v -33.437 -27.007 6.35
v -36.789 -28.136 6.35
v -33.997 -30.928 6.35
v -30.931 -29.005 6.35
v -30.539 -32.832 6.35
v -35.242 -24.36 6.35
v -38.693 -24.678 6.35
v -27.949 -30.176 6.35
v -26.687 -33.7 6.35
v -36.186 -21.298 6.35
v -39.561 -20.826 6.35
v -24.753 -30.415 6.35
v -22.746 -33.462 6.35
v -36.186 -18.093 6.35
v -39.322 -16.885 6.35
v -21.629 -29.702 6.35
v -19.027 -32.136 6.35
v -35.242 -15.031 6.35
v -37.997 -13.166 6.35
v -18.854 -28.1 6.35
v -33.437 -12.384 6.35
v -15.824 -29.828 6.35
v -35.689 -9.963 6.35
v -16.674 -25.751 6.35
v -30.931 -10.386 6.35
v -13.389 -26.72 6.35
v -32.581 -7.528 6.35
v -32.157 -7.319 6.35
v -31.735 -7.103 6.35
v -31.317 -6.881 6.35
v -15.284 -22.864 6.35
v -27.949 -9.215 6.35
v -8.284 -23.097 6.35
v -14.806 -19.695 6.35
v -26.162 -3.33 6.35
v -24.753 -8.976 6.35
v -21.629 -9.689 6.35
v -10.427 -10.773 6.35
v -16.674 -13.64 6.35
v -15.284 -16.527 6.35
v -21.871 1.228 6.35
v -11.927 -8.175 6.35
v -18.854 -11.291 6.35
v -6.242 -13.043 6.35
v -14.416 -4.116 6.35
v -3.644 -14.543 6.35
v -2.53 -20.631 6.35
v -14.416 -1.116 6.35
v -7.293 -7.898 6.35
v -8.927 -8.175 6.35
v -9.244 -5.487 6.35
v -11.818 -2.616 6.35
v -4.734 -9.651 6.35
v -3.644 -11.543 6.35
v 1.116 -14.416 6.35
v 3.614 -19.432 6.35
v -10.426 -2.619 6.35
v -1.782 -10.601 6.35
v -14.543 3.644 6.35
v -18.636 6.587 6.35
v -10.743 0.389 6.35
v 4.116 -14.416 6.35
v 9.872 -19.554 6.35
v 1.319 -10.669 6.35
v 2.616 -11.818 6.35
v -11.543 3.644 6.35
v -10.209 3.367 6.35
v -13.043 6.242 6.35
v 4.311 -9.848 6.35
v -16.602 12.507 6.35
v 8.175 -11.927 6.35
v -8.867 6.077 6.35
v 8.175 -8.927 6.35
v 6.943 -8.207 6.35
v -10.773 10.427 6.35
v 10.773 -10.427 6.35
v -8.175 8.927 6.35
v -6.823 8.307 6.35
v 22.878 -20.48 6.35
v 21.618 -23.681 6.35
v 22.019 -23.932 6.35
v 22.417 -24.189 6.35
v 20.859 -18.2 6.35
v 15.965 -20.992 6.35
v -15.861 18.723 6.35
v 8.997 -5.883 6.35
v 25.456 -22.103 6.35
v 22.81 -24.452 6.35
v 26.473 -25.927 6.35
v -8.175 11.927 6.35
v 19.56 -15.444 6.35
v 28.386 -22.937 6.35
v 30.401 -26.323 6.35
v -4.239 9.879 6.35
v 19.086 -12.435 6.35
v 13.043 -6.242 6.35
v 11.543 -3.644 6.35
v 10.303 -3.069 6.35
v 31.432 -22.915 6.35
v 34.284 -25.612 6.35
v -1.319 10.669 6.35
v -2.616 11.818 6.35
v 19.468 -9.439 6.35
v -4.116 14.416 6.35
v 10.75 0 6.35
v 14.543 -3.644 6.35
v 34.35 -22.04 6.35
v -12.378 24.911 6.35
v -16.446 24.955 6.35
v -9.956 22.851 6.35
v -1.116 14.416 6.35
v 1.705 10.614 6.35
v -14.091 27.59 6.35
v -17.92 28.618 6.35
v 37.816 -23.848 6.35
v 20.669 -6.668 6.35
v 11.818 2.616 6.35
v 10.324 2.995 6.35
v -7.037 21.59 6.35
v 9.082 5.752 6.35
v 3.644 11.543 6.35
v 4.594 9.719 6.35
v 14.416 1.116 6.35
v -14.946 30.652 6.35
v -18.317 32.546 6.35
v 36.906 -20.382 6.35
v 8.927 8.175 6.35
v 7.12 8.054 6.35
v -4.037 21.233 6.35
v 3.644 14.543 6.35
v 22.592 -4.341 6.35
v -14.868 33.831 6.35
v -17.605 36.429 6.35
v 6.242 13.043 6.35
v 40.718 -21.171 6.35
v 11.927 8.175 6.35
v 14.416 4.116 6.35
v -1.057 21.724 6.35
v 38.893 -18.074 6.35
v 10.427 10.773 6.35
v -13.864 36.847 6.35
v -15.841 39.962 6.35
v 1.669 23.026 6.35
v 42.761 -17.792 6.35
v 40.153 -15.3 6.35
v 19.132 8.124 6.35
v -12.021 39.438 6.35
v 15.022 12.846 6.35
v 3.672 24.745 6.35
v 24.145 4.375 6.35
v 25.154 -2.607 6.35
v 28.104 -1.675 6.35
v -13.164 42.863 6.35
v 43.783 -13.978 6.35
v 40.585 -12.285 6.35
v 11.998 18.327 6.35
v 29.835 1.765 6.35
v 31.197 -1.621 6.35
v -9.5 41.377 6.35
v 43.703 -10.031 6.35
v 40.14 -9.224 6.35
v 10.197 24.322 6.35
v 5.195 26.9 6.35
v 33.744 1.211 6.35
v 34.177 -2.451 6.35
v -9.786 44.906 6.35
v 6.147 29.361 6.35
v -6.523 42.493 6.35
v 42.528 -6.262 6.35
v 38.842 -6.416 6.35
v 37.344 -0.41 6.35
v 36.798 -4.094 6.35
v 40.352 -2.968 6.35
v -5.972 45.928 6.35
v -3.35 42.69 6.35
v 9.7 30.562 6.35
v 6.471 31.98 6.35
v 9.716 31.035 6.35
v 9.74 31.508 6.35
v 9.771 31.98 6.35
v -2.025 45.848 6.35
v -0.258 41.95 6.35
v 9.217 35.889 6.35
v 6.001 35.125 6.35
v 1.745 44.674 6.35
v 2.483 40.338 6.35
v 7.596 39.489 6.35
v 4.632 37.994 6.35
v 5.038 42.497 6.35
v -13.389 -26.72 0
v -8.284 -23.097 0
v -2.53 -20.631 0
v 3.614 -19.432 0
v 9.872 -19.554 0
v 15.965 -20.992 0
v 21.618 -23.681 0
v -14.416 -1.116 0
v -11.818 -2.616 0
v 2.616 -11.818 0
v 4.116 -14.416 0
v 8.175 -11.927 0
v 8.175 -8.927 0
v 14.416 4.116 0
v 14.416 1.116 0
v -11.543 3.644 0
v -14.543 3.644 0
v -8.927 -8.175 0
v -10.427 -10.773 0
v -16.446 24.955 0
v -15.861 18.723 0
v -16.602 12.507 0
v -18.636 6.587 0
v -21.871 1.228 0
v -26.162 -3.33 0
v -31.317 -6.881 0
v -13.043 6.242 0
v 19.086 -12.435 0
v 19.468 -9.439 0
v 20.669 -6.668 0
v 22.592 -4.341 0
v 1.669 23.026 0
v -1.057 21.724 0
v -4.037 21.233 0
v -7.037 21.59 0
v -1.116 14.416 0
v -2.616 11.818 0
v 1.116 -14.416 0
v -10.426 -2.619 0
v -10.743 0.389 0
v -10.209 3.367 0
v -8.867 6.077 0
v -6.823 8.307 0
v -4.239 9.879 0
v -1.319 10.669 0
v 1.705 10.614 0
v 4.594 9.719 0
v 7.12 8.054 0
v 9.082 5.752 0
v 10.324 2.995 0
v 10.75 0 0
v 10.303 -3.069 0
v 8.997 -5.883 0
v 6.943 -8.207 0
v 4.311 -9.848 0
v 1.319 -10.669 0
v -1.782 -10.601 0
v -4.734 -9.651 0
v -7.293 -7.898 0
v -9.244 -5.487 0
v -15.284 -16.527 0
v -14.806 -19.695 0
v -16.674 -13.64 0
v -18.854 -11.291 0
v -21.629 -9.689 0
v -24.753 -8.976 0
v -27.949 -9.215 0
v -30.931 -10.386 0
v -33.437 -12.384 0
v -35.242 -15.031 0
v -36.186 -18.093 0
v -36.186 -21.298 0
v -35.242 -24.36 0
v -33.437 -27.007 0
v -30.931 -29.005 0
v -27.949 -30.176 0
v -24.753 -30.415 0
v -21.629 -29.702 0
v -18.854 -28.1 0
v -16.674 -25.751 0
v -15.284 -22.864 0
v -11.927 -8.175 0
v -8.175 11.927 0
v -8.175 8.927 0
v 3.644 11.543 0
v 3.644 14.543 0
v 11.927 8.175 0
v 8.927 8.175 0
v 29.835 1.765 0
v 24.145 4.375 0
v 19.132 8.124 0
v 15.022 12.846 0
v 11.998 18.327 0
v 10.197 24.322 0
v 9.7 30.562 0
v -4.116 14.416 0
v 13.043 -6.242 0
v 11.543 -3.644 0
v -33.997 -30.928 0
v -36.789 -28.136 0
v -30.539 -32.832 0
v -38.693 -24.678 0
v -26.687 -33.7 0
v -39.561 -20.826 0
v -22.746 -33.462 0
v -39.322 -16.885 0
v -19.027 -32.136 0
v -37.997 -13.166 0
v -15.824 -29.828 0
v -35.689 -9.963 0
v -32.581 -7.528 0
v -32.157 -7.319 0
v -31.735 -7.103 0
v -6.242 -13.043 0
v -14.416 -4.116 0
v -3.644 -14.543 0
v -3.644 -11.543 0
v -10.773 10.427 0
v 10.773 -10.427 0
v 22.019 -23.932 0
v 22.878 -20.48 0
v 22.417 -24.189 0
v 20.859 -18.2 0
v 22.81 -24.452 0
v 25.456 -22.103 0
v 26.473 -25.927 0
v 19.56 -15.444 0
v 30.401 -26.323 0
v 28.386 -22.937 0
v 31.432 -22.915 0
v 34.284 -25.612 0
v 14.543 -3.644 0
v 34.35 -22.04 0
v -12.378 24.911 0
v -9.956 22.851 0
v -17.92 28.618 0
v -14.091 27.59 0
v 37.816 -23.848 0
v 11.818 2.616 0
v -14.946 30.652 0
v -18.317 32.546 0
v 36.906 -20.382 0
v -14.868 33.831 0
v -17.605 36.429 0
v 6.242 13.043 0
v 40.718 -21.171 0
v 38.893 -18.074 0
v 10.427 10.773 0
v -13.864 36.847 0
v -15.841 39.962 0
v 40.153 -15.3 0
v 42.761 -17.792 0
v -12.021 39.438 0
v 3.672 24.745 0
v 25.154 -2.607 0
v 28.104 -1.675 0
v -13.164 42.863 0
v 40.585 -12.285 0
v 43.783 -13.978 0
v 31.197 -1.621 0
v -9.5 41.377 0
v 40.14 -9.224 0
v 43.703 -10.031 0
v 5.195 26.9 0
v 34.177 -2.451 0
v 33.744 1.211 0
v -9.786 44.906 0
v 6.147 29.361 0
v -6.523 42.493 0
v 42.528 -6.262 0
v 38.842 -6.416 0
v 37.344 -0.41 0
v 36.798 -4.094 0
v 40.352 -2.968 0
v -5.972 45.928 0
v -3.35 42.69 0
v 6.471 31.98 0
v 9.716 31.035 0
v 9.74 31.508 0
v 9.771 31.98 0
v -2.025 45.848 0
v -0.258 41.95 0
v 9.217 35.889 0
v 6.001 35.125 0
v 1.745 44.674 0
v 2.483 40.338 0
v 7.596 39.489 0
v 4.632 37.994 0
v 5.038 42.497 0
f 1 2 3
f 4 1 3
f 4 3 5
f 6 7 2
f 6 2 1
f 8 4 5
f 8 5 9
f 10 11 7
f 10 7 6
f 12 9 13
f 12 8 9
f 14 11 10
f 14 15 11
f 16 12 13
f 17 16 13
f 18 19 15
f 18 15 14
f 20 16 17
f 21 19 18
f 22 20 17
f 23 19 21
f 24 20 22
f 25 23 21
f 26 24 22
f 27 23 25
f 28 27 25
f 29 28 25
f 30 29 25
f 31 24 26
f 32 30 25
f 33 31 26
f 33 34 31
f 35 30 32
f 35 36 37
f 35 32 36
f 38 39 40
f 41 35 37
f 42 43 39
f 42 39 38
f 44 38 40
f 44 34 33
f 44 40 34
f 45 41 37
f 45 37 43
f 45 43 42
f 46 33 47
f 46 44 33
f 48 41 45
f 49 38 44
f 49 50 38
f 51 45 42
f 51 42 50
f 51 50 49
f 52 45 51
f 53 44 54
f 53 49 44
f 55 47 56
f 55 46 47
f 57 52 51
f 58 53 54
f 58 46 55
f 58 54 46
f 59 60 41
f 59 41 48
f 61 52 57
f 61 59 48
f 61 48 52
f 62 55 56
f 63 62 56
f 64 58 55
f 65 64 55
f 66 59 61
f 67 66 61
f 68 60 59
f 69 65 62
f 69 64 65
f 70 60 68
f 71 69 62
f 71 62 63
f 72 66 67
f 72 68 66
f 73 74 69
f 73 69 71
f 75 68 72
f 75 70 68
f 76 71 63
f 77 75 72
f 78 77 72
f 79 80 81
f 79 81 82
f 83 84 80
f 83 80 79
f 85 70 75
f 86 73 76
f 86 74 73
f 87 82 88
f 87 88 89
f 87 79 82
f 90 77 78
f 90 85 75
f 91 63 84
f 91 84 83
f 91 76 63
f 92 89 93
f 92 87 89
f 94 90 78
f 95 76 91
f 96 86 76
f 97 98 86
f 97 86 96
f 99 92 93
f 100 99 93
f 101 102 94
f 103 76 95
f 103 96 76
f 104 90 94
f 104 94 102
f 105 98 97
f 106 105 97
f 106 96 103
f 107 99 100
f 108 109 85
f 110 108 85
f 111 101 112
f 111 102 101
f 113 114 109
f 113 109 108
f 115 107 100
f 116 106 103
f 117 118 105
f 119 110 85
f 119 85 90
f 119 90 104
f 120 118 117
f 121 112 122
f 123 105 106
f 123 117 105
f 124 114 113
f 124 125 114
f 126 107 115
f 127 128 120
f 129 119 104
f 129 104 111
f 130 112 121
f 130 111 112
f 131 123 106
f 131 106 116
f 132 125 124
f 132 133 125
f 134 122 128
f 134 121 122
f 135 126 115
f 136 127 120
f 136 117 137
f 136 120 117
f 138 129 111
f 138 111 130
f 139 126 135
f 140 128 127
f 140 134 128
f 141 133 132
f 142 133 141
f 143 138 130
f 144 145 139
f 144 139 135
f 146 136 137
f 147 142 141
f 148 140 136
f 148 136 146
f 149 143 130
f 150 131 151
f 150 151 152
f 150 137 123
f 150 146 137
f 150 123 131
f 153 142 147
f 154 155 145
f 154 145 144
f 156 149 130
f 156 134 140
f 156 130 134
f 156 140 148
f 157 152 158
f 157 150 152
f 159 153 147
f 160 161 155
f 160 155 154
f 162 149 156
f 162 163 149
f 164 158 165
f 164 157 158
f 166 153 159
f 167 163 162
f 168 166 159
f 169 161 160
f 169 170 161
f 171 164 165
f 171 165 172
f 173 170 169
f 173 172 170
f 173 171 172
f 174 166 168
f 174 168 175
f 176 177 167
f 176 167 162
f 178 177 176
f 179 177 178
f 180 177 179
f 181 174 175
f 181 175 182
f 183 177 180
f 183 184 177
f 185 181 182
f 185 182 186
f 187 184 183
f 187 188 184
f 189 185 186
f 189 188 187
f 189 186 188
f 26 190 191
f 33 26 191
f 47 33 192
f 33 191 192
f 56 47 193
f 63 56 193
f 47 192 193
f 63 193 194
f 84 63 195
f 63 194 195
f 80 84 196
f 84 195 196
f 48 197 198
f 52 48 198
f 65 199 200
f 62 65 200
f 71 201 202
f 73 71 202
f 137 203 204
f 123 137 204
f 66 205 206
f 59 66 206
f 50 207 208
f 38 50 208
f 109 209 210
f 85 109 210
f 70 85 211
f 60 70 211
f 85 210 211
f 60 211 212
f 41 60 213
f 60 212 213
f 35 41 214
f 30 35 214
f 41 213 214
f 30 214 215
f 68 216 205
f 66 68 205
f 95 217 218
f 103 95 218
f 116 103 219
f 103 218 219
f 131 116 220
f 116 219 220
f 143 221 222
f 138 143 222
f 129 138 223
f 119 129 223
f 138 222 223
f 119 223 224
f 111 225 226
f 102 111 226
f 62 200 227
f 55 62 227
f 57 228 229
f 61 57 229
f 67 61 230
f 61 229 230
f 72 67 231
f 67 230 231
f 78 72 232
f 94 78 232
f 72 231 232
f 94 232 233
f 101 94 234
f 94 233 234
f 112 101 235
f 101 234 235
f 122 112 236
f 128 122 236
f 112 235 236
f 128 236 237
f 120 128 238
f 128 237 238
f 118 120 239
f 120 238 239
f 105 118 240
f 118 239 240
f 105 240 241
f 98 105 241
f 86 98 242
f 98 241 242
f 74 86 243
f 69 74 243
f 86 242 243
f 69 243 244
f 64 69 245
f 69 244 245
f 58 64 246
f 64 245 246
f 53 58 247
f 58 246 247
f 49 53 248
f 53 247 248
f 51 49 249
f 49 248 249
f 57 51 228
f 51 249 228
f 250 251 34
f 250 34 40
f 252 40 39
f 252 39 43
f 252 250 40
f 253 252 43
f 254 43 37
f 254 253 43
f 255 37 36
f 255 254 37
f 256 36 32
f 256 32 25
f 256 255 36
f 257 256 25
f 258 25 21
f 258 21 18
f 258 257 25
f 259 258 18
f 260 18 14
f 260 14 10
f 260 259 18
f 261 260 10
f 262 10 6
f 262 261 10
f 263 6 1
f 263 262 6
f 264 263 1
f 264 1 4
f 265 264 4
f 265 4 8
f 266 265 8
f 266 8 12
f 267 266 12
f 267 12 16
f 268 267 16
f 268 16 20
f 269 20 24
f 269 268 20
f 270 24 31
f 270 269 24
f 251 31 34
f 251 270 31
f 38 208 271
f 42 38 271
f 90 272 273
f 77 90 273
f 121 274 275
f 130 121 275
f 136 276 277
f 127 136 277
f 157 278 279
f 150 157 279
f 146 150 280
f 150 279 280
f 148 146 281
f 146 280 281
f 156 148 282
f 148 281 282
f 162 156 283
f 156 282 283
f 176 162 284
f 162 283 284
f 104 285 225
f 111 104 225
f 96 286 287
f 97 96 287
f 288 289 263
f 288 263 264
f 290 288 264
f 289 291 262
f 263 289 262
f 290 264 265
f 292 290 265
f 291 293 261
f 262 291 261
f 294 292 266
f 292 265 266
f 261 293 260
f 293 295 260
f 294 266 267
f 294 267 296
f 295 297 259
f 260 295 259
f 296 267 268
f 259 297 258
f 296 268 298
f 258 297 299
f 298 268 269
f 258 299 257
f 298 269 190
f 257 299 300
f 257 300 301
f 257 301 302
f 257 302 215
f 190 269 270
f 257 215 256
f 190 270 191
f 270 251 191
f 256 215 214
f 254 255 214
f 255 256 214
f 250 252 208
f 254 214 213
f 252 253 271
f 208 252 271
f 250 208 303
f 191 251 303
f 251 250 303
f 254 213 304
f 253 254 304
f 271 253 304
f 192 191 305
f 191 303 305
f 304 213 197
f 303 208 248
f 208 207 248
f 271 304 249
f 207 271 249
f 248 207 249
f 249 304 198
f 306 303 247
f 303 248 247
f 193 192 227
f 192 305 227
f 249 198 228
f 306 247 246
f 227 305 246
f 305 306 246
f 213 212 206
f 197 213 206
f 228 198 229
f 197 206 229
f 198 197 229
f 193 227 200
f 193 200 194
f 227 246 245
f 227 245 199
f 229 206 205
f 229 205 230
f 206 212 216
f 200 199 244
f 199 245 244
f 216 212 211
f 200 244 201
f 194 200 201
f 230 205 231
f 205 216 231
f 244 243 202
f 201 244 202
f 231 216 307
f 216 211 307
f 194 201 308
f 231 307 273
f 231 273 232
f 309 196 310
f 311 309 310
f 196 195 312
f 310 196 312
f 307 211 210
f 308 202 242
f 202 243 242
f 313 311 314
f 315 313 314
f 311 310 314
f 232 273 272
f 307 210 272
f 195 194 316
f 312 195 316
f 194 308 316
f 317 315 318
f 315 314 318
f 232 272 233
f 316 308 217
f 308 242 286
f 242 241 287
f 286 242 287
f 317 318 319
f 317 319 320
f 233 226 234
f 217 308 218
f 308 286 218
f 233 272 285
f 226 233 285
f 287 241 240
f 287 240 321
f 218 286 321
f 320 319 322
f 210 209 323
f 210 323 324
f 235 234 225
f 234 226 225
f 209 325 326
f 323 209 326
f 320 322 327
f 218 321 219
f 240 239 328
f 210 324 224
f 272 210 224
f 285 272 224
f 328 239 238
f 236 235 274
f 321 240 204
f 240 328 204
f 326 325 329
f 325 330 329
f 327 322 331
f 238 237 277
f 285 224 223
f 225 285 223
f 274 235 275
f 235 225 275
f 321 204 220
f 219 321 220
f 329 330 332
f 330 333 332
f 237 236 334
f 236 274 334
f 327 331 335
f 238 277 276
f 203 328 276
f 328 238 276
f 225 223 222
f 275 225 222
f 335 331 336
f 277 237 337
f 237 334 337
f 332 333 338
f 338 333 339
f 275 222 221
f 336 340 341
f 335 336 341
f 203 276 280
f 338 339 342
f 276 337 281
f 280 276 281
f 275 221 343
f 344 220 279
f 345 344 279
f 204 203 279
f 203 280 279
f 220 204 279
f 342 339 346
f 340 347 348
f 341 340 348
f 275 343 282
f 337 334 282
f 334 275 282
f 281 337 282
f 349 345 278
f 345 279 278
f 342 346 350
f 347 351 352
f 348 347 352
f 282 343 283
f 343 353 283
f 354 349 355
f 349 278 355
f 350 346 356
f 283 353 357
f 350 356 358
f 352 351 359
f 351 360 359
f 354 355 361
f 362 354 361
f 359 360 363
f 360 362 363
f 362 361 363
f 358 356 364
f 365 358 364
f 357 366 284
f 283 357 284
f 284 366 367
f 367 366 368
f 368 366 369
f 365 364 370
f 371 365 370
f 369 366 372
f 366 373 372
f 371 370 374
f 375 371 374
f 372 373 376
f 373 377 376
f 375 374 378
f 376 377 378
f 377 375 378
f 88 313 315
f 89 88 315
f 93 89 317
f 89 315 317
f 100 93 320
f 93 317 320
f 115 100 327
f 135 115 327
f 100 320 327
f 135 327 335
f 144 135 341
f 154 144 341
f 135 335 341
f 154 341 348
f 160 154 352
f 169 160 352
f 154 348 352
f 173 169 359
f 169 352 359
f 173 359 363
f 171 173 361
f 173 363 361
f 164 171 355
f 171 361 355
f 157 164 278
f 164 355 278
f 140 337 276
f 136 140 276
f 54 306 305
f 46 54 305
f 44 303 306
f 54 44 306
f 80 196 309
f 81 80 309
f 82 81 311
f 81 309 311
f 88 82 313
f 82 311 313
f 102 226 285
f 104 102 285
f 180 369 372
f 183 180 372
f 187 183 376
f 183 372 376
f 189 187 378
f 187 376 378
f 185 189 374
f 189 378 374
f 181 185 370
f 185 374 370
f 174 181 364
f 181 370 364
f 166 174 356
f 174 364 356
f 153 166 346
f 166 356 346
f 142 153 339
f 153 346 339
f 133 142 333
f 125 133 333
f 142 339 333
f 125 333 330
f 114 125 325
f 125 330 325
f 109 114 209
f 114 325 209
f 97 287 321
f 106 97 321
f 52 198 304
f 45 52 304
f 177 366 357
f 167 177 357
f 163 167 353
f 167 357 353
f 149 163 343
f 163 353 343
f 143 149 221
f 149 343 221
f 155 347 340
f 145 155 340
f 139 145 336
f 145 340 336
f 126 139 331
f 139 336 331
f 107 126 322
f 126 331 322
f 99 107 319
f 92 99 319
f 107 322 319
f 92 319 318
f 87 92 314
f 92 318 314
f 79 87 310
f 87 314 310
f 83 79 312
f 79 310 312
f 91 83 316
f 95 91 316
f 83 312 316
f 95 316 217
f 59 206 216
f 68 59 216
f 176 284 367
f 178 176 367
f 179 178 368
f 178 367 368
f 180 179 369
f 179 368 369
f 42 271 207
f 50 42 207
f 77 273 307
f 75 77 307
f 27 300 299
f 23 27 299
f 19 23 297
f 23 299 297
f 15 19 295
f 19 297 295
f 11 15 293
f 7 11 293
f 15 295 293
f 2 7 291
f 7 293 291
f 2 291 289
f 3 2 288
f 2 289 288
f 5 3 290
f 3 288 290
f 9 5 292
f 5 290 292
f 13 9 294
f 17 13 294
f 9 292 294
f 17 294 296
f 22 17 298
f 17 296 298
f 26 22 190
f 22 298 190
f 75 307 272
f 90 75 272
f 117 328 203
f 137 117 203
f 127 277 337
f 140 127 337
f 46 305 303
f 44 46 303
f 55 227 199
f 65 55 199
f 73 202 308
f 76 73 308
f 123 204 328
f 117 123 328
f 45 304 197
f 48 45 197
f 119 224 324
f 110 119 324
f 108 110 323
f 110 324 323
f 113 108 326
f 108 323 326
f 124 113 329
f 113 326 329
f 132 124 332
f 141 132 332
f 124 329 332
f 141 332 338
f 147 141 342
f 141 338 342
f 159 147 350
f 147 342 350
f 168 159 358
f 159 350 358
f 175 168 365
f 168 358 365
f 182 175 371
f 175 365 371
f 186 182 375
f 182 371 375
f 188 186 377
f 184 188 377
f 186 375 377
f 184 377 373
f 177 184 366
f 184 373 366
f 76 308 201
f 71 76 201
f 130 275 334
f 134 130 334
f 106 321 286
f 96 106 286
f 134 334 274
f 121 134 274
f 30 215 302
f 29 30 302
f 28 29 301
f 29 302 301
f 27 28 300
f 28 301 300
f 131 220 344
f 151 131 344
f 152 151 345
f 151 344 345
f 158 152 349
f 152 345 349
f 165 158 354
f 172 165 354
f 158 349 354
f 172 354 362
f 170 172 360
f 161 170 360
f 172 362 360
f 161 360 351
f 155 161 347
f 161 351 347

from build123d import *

# Parameters (mm, degrees)
F0_R     = 10.75
F1_DEPTH = 6.35


with BuildPart() as f1:
    # F0 (on Top) → F1 (new body)
    with BuildSketch(Plane.XY):
        with BuildLine():
            ThreePointArc((-16.446219, 24.955231), (-18.635535, 6.586639), (-31.317256, -6.880812))
            ThreePointArc((-31.317256, -6.880812), (-31.945446, -7.211903), (-32.581411, -7.527802))
            ThreePointArc((-32.581411, -7.527802), (-35.491262, -29.630309), (-13.388754, -26.720459))
            ThreePointArc((-13.388754, -26.720459), (3.613571, -19.432166), (21.617586, -23.681133))
            ThreePointArc((21.617586, -23.681133), (22.218414, -24.059617), (22.809974, -24.452429))
            ThreePointArc((22.809974, -24.452429), (43.406231, -15.921179), (29.834974, 1.765228))
            ThreePointArc((29.834974, 1.765228), (15.021964, 12.845527), (9.69967, 30.561945))
            ThreePointArc((9.69967, 30.561945), (9.727032, 31.271519), (9.771438, 31.980231))
            ThreePointArc((9.771438, 31.980231), (-7.91497, 45.551489), (-16.446219, 24.955231))
        make_face()
        with Locations((-25.556411, -19.695459)):
            Circle(F0_R, mode=Mode.SUBTRACT)
        Polygon((-8.926963, -8.174784), (-10.426963, -10.772861), (-11.926963, -8.174784), align=None, mode=Mode.SUBTRACT)
        Polygon((-3.643584, -11.543052), (-3.643584, -14.543052), (-6.241661, -13.043052), align=None, mode=Mode.SUBTRACT)
        Polygon((-11.818369, -2.61609), (-14.416445, -4.11609), (-14.416445, -1.11609), align=None, mode=Mode.SUBTRACT)
        Polygon((-11.543052, 3.643584), (-14.543052, 3.643584), (-13.043052, 6.241661), align=None, mode=Mode.SUBTRACT)
        with BuildLine():
            ThreePointArc((-10.42615, -2.618758), (-1.319353, 10.66873), (10.75, 0))
            ThreePointArc((10.75, 0), (1.319353, -10.66873), (-10.42615, -2.618758))
        make_face(mode=Mode.SUBTRACT)
        Polygon((2.61609, -11.818369), (4.11609, -14.416445), (1.11609, -14.416445), align=None, mode=Mode.SUBTRACT)
        Polygon((8.174784, -8.926963), (10.772861, -10.426963), (8.174784, -11.926963), align=None, mode=Mode.SUBTRACT)
        Polygon((11.543052, -3.643584), (14.543052, -3.643584), (13.043052, -6.241661), align=None, mode=Mode.SUBTRACT)
        Polygon((11.818369, 2.61609), (14.416445, 4.11609), (14.416445, 1.11609), align=None, mode=Mode.SUBTRACT)
        with BuildLine():
            ThreePointArc((22.592473, -4.340674), (34.176956, -2.450663), (40.584974, -12.284772))
            ThreePointArc((40.584974, -12.284772), (29.91008, -23.034509), (19.086023, -12.434981))
            ThreePointArc((19.086023, -12.434981), (19.970769, -8.011603), (22.592473, -4.340674))
        make_face(mode=Mode.SUBTRACT)
        Polygon((-8.174784, 8.926963), (-10.772861, 10.426963), (-8.174784, 11.926963), align=None, mode=Mode.SUBTRACT)
        Polygon((-2.61609, 11.818369), (-4.11609, 14.416445), (-1.11609, 14.416445), align=None, mode=Mode.SUBTRACT)
        with BuildLine():
            ThreePointArc((-7.0369, 21.590136), (-10.832583, 40.501224), (6.471438, 31.980231))
            ThreePointArc((6.471438, 31.980231), (5.19515, 26.89975), (1.669339, 23.025625))
            ThreePointArc((1.669339, 23.025625), (-2.52971, 21.37344), (-7.0369, 21.590136))
        make_face(mode=Mode.SUBTRACT)
        Polygon((8.926963, 8.174784), (10.426963, 10.772861), (11.926963, 8.174784), align=None, mode=Mode.SUBTRACT)
        Polygon((3.643584, 11.543052), (3.643584, 14.543052), (6.241661, 13.043052), align=None, mode=Mode.SUBTRACT)
    extrude(amount=F1_DEPTH)


solid = f1.part
